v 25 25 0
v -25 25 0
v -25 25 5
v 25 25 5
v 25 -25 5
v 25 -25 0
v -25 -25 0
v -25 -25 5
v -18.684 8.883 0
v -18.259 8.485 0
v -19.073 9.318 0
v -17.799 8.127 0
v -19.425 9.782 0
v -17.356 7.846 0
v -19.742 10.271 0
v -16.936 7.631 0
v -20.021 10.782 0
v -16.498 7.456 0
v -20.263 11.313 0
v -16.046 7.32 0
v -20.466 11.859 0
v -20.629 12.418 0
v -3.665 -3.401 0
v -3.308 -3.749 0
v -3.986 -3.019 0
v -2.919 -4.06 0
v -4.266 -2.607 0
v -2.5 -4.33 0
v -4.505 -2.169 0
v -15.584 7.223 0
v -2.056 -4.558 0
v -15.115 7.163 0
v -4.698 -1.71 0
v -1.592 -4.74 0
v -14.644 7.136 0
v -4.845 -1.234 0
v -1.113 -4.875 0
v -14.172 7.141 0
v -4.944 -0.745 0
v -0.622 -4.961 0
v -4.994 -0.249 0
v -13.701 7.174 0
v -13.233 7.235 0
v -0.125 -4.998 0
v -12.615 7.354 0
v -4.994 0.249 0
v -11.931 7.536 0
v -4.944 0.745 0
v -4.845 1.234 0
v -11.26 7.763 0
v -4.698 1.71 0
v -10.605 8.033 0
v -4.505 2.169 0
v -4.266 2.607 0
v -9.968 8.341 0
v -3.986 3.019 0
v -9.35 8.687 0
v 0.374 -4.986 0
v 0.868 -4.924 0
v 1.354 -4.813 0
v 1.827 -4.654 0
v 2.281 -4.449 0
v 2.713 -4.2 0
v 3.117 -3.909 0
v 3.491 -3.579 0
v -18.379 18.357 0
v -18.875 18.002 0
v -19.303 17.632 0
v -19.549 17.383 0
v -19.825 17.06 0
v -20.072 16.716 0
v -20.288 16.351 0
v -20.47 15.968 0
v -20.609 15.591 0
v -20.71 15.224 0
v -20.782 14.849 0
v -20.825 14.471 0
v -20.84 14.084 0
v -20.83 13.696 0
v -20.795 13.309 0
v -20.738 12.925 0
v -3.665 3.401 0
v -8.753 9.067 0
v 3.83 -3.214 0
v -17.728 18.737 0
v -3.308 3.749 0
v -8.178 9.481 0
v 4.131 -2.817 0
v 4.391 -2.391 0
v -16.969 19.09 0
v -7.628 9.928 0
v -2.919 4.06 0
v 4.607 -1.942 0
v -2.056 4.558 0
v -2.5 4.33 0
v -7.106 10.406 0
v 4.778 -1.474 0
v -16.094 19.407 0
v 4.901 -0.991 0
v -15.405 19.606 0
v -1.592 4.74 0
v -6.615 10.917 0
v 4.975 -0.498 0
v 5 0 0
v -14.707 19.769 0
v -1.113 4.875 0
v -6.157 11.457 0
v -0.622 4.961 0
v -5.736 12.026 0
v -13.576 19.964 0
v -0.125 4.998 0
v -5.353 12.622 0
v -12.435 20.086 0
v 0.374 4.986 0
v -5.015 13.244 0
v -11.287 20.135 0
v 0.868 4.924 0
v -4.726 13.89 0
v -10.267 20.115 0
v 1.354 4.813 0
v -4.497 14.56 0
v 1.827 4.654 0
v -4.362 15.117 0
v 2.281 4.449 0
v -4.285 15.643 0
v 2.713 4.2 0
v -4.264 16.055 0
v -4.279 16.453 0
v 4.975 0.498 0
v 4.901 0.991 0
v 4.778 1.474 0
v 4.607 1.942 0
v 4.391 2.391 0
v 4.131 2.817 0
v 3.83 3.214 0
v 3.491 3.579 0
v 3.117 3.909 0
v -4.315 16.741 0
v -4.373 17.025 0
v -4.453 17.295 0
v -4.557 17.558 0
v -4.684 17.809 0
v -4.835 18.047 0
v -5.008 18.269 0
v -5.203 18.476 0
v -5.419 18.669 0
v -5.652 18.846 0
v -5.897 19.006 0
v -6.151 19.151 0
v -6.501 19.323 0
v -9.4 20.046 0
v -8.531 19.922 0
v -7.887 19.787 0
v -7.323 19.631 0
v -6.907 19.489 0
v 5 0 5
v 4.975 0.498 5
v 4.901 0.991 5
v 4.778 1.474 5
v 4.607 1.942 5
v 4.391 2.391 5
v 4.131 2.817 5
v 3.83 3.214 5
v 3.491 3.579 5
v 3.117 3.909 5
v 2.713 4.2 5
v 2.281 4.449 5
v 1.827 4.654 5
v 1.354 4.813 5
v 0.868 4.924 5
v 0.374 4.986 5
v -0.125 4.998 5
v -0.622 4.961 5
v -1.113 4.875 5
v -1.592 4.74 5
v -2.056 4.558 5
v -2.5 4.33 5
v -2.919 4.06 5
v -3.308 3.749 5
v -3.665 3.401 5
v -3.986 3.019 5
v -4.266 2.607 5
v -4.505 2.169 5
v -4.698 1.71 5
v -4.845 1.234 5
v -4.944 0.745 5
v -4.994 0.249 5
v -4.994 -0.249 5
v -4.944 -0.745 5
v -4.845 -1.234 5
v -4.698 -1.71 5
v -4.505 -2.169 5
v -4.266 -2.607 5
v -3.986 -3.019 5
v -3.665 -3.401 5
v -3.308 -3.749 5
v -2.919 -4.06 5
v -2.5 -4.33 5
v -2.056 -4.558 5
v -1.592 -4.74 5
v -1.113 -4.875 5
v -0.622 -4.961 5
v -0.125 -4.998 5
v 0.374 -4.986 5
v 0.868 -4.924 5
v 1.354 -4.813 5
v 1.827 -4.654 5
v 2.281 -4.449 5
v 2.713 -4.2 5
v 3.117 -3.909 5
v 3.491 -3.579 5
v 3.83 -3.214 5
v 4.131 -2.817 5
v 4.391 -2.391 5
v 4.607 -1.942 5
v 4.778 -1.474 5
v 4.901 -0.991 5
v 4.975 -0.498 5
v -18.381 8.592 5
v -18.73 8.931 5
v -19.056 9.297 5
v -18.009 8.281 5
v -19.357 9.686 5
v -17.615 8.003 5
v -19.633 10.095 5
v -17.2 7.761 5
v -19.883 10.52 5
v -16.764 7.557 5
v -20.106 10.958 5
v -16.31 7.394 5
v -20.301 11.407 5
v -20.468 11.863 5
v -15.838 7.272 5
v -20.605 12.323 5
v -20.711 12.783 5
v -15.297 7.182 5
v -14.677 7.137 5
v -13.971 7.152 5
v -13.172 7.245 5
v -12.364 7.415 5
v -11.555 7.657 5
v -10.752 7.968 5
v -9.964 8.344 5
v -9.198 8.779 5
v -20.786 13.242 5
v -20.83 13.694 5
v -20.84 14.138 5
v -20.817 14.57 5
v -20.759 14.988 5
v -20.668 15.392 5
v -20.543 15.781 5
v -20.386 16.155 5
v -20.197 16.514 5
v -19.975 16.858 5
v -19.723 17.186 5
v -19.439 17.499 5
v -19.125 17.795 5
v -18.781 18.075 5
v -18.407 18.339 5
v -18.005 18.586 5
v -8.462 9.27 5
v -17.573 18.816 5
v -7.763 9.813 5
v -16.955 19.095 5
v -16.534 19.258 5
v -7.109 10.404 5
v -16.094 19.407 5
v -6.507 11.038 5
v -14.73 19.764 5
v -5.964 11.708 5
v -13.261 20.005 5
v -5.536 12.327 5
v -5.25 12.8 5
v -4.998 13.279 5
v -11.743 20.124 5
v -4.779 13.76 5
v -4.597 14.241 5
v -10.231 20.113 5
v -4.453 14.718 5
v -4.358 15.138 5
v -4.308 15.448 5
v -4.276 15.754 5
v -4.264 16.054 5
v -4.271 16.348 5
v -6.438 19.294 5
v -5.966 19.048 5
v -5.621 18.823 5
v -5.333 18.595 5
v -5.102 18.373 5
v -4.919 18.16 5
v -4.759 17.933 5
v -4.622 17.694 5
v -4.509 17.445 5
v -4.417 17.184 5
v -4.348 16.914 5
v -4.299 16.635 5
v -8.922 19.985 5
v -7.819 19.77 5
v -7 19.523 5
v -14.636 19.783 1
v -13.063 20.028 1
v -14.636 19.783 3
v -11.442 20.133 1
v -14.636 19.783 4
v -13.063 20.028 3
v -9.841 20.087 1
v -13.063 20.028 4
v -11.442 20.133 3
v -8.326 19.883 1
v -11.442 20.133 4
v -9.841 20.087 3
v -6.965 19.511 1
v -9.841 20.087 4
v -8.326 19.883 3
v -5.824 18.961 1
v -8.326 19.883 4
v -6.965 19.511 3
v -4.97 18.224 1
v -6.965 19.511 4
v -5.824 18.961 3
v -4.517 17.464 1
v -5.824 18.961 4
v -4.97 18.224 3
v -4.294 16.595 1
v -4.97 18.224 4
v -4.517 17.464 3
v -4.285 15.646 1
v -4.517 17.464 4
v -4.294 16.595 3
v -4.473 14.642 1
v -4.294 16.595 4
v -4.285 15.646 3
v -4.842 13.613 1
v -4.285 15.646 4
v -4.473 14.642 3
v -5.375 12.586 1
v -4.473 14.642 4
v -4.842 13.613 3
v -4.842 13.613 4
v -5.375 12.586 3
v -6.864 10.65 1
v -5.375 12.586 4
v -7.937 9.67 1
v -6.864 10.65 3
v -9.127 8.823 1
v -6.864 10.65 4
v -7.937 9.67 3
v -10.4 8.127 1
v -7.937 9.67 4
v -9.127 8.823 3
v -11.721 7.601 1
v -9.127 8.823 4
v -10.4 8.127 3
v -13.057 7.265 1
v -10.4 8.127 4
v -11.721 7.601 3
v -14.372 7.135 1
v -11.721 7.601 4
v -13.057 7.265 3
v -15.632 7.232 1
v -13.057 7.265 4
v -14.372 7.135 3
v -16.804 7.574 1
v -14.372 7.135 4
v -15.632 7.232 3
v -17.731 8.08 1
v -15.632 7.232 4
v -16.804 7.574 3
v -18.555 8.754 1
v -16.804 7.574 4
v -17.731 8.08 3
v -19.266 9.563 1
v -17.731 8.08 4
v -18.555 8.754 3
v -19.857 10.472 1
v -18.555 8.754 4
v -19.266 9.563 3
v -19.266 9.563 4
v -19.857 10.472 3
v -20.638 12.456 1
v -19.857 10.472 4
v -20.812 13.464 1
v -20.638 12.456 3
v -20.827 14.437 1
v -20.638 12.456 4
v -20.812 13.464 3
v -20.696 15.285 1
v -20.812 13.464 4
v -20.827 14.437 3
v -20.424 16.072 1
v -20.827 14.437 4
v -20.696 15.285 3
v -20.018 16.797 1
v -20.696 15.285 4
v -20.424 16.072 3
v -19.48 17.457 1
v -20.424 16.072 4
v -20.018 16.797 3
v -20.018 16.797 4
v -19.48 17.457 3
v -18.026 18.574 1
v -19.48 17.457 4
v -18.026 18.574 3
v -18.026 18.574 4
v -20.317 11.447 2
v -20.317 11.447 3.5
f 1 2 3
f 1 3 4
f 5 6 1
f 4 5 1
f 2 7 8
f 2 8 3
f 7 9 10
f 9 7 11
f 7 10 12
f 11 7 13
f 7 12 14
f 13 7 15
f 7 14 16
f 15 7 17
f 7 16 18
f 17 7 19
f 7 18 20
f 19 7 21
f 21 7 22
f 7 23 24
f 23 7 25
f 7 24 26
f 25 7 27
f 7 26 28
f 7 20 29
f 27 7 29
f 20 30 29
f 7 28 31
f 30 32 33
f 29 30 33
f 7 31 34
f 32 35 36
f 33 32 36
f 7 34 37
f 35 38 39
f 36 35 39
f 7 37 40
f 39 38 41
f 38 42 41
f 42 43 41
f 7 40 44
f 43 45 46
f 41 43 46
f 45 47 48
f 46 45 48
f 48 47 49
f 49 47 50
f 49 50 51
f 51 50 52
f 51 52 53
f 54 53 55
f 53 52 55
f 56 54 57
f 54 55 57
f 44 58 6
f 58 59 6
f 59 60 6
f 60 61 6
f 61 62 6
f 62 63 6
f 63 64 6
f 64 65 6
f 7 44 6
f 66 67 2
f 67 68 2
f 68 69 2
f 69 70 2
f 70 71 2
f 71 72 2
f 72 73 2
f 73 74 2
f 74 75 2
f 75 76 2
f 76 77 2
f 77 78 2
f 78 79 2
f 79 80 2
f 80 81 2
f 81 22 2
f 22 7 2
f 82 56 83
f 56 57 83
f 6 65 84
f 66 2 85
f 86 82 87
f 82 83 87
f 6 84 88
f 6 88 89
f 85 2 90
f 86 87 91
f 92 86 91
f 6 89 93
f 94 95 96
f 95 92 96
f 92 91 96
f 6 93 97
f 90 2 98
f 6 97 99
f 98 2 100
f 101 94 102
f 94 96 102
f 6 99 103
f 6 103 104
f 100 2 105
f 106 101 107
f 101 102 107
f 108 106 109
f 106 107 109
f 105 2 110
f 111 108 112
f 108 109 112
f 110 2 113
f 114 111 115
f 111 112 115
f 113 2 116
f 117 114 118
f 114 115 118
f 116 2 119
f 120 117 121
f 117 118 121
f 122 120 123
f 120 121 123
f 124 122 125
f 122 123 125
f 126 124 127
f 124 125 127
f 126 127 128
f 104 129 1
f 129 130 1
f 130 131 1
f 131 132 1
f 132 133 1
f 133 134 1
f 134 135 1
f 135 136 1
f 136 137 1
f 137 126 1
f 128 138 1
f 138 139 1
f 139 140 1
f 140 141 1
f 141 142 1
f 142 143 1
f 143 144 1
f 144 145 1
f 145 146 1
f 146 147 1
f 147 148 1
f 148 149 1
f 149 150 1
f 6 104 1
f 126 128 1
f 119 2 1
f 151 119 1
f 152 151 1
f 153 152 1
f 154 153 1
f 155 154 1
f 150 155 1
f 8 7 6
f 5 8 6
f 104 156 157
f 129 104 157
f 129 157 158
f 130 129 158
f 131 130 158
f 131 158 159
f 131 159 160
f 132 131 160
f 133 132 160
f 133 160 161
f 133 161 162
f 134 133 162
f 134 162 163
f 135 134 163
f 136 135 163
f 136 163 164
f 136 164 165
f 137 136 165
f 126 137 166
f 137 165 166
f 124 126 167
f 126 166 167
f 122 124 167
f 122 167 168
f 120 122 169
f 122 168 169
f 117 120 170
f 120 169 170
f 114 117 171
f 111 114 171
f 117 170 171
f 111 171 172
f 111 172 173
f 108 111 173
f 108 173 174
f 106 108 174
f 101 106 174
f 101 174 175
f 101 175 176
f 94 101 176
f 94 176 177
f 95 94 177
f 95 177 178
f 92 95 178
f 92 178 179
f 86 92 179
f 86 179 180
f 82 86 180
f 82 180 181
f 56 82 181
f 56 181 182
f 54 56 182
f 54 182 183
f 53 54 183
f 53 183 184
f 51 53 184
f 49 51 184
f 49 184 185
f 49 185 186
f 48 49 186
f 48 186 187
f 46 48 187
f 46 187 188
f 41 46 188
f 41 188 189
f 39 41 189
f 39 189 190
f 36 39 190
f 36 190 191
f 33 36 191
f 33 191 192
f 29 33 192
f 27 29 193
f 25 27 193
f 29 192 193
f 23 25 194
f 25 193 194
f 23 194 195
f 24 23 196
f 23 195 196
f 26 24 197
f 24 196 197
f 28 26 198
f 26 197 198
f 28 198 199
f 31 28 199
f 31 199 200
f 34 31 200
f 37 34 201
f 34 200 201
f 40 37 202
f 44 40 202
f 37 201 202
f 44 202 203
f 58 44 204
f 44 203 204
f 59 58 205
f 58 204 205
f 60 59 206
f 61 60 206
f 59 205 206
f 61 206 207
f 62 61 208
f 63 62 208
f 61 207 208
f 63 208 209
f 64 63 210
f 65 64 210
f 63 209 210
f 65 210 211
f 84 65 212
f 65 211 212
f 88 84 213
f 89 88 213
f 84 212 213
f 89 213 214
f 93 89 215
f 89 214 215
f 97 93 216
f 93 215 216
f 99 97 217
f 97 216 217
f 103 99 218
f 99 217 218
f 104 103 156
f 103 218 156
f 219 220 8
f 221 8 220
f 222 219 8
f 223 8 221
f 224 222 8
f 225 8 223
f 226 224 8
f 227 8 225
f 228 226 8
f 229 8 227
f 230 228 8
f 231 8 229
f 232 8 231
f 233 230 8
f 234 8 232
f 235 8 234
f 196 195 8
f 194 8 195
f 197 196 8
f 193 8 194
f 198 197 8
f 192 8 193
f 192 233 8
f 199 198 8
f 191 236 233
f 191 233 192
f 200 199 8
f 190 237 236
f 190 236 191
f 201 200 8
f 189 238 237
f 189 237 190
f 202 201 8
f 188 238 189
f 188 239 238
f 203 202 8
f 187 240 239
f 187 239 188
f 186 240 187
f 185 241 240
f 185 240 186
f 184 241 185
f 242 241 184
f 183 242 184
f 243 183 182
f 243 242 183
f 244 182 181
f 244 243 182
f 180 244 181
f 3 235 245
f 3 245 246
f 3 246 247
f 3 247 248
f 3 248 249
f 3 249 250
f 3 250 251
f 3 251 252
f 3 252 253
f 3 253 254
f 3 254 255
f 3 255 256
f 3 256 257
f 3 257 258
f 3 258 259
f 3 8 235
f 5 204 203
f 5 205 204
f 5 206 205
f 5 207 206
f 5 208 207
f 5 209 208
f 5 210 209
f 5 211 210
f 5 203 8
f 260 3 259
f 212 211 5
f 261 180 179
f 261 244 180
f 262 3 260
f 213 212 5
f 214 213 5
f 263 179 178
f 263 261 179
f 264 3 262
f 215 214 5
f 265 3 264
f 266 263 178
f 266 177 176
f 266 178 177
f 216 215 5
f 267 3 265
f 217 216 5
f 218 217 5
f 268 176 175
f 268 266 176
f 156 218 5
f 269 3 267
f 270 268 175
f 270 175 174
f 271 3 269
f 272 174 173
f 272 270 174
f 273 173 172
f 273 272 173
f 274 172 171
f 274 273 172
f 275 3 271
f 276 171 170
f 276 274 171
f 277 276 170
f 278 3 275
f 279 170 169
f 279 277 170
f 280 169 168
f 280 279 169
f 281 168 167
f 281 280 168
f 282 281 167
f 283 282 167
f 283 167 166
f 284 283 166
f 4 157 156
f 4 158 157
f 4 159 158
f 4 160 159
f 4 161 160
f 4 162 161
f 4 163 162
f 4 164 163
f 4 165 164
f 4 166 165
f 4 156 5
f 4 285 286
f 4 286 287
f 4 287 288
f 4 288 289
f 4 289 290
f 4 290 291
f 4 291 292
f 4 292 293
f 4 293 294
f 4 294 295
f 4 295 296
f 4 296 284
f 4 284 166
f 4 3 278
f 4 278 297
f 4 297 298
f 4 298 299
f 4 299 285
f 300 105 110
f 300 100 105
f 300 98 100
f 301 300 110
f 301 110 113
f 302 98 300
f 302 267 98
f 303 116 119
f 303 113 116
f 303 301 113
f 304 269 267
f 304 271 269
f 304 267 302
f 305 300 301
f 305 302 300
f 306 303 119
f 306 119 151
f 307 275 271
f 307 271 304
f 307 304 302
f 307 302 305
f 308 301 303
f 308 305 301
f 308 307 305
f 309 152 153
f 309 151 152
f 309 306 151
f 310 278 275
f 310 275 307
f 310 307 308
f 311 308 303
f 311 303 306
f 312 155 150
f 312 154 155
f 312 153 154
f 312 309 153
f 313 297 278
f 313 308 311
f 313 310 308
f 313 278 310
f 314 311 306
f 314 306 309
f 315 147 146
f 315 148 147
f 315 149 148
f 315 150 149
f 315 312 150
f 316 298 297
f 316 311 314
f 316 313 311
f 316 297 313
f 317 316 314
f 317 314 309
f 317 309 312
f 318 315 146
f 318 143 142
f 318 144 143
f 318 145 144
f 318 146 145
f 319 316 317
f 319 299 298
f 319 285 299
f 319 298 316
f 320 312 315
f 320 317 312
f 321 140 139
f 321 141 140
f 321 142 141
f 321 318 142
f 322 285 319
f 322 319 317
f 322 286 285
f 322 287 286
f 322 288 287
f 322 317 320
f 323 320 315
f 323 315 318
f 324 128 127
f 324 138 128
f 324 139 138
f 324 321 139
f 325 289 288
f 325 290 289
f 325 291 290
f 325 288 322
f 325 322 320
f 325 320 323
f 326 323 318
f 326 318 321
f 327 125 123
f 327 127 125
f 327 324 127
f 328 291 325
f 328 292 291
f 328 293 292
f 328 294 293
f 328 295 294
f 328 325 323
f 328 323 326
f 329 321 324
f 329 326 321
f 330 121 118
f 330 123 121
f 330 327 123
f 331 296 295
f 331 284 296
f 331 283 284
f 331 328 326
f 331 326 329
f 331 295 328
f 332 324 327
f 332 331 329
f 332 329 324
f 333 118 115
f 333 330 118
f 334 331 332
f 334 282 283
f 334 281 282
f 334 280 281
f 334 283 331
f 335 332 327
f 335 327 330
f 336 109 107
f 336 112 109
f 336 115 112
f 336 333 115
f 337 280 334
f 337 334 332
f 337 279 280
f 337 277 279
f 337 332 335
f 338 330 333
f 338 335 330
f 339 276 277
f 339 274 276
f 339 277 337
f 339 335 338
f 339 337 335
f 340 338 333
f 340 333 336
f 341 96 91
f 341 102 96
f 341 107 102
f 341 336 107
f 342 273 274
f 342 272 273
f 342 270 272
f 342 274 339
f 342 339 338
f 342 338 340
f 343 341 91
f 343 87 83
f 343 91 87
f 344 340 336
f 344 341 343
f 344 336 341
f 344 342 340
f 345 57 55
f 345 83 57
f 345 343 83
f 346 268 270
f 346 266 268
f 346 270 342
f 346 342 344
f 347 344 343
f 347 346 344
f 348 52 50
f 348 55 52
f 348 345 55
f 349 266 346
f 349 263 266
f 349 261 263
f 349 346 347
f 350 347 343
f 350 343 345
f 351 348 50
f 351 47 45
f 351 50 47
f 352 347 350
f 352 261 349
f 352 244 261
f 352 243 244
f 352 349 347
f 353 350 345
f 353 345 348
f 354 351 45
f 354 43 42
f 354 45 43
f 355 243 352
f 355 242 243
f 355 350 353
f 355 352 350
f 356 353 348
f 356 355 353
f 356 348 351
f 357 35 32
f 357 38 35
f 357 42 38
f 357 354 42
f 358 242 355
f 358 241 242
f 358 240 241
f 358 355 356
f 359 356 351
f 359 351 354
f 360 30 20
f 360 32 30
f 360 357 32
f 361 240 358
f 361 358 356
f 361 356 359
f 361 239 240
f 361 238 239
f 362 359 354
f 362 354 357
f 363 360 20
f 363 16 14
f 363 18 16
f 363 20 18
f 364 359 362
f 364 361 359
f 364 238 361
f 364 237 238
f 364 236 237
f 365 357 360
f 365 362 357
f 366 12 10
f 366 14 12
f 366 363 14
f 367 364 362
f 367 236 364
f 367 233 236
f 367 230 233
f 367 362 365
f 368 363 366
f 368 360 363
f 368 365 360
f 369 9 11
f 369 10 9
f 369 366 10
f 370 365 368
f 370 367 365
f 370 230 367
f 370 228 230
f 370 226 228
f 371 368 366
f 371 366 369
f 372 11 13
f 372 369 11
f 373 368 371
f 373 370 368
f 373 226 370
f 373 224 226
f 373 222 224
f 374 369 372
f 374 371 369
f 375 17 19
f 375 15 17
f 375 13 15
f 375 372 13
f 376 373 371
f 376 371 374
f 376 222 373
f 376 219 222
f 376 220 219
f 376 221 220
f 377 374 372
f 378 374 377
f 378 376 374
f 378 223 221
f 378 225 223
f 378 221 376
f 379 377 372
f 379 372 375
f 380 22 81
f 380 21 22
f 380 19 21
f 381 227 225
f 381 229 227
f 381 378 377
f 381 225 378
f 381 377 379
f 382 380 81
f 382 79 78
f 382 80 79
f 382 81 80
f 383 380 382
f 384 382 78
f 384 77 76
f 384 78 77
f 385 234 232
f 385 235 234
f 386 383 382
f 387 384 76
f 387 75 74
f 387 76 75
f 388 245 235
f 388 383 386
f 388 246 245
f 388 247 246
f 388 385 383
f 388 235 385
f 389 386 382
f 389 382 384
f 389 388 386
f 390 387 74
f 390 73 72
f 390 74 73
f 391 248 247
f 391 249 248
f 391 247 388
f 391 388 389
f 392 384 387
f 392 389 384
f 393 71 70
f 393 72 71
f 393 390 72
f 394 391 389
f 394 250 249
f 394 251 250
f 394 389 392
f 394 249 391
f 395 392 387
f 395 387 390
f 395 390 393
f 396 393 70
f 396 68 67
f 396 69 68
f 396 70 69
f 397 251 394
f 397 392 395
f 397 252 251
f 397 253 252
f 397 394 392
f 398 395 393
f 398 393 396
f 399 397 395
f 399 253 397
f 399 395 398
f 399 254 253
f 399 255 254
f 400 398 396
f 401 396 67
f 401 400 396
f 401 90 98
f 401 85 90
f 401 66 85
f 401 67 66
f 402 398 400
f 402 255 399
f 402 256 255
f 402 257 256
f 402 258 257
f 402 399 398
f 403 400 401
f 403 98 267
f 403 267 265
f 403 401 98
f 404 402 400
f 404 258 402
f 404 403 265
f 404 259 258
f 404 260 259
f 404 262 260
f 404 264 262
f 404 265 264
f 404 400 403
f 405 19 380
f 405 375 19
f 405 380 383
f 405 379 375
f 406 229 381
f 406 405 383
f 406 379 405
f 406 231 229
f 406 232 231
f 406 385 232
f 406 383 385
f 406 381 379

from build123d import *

# Parameters (mm, degrees)
F0_W     = 50
F0_H     = 50
F1_DEPTH = 5
F2_R     = 5
F3_DEPTH = 25
F5_DEPTH = 25


with BuildPart() as f1:
    # F0 (on Top) → F1 (new body)
    with BuildSketch(Plane.XY):
        Rectangle(F0_W, F0_H)
    extrude(amount=F1_DEPTH)

    # F2 (on face) → F3 (cut)
    with BuildSketch(Plane.XY.offset(5)):
        Circle(F2_R)
    extrude(amount=-F3_DEPTH, mode=Mode.SUBTRACT)

    # F4 (on face) → F5 (cut)
    with BuildSketch(Plane.XY.offset(5)):
        with BuildLine():
            add(Edge.make_bspline(
                [(-16.0939358175, 19.4073952734), (-12.4173646388, 20.576681651), (-2.1134920052, 20.3363583902), (-5.8241318664, 9.2256089441), (-17.5792885427, 4.957394915), (-22.4856509352, 14.9328212493), (-18.9737953325, 18.491492837), (-16.0939358175, 19.4073952734)],
                knots=[0, 0, 0, 0, 0.2259129236, 0.4146370942, 0.6325225982, 0.8230423264, 1, 1, 1, 1], degree=3))
        make_face()
    extrude(amount=-F5_DEPTH, mode=Mode.SUBTRACT)


solid = f1.part
